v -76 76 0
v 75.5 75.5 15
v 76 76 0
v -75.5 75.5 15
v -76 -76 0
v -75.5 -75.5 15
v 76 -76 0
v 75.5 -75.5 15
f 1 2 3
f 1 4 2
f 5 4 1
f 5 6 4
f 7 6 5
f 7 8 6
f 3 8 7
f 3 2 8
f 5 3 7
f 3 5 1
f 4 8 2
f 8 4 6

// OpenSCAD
// Infiniground SCAD Generator
// Forked from https://github.com/DanielJoyce/ultimate_base_generator
// Under CC-BY-SA-4.0

/* [Base] */

// Polygon
base_style = 4; // [3:triangle,4:square,5:pentagon,6:hexagon,7:heptagon,8:octagon,50:round]

// Base diameter,
diameter = 152; // [15:250]

// Thickness of base, ~3 mm is standard:
thickness = 15; // [1:25]

// Stretch base along x-axis
stretch_perc = 0; // [0:400]

/* [Slot or Stand] */

// Should base have a slot or stand?
slot = 0; // [0:Neither, 1:Slot, 2:Stand]

// Orientation of base
base_orientation = 1; // [1:style 1, 2:style 2]

// Orientation of slot
slot_orientation = 1; // [1:x axis, 2:y axis]

// Normally 25 mm square / hex base diameter is measured side to side:
across_sides = 1; // [0:no, 1:yes]

// Stand height in mm from ground, does not include peg length
stand_height = 28; // [10:112]

// Diameter of peg in tenths of mm
peg_diameter = 10; // [10:100]

// Length of peg in mm
peg_height = 5; // [2:10]

/* [Texture] */

// File for surface texture
texture_filename = "texture.dat"; // [image_surface:100x100]

// How much to scale the texture vertically, 10 = no scaling
texture_scale = 10; // [1:50]

// How much the texture is moved up/down the top of the base
panel_offset = 0; // [-20:20]

/* [Hidden] */

radius = diameter / 2;

cos_r = cos(360/(2*base_style));

scale_factor = across_sides == 0 ? 1 : 1 / cos_r;

offset = (diameter * scale_factor) + 2;

stretch_x = stretch_perc / 100;

module texture(diameter, texture_scale) {
  scale_factor = (diameter+0.5)/100;
  scale([scale_factor,scale_factor,texture_scale]) {
    surface(file=texture_filename, center=true);
  }
}


module texture_panel(sides, diameter, texture_scale){
  radius = diameter/2;
  intersection(){
    cylinder(h=20,r=radius, $fn=sides);
    translate([0,0,1]) texture(diameter, texture_scale);
  }
}

module stand(stand_height, peg_height, peg_diam) {
  peg_r = peg_diam / 2;
  stand_r2 = peg_r +.5;
  stand_r1 = peg_r +1;
  union(){
    // peg
    cylinder(r1=peg_r, r2=peg_r,h=stand_height+peg_height, $fn=50);
    cylinder(r1=stand_r1, r2=stand_r2, h=stand_height - 0.01, $fn=50);
  }
}


module base(sides,
  diameter = 25,
  slot = false,
  stand = false,
  height = 3.33,
  base_x = true,
  slot_x = true,
  stand_height = 40,
  peg_height = 4,
  peg_diameter = 2,
  inset = false,
  texture_scale = 1.0,
  panel_offset = -0.4){
  radius = diameter / 2;
  cos_r = cos(360/(2*sides));
  scale_factor = inset ? 1 : 1 / cos_r;
  slot_width = cos_r*diameter*0.9*scale_factor;
  slot_angle = slot_x ? 0 : 90;
  even = sides % 2 == 0;
  base_angle = even ? 360 / (2*sides) : 90;
  base_r = base_x ? 0 : base_angle;
  top_radius = radius - 0.5;
  difference(){
    union(){
      if(stand){
        translate([0,0,0.5]){
          stand(stand_height-0.5, peg_height, peg_diameter);
        }
      }
      scale([scale_factor + stretch_x, scale_factor,1]) rotate([0,0,360/(2*sides)]) {
        rotate([0,0, base_r]) cylinder(h = height, r1=radius, r2=top_radius, $fn=sides);
        translate([0,0,height-1+panel_offset]){
          texture_panel(sides=sides,
                    diameter=diameter-1,
                    texture_scale=texture_scale);
        }
      }
    }
    if(slot){
      rotate([0,0,slot_angle]) cube([2.3,slot_width,height+10], center=true);
    }
  }
}


base(base_style,
    diameter = diameter,
    slot = (slot == 1),
    stand = (slot == 2),
    height = thickness,
    inset = (across_sides == 0),
    stand_height = stand_height,
    peg_height = peg_height,
    peg_diameter = peg_diameter/10,
    base_x = (base_orientation == 1),
    slot_x = (slot_orientation == 1),
    panel_offset = panel_offset/10,
    texture_scale = texture_scale/10);
